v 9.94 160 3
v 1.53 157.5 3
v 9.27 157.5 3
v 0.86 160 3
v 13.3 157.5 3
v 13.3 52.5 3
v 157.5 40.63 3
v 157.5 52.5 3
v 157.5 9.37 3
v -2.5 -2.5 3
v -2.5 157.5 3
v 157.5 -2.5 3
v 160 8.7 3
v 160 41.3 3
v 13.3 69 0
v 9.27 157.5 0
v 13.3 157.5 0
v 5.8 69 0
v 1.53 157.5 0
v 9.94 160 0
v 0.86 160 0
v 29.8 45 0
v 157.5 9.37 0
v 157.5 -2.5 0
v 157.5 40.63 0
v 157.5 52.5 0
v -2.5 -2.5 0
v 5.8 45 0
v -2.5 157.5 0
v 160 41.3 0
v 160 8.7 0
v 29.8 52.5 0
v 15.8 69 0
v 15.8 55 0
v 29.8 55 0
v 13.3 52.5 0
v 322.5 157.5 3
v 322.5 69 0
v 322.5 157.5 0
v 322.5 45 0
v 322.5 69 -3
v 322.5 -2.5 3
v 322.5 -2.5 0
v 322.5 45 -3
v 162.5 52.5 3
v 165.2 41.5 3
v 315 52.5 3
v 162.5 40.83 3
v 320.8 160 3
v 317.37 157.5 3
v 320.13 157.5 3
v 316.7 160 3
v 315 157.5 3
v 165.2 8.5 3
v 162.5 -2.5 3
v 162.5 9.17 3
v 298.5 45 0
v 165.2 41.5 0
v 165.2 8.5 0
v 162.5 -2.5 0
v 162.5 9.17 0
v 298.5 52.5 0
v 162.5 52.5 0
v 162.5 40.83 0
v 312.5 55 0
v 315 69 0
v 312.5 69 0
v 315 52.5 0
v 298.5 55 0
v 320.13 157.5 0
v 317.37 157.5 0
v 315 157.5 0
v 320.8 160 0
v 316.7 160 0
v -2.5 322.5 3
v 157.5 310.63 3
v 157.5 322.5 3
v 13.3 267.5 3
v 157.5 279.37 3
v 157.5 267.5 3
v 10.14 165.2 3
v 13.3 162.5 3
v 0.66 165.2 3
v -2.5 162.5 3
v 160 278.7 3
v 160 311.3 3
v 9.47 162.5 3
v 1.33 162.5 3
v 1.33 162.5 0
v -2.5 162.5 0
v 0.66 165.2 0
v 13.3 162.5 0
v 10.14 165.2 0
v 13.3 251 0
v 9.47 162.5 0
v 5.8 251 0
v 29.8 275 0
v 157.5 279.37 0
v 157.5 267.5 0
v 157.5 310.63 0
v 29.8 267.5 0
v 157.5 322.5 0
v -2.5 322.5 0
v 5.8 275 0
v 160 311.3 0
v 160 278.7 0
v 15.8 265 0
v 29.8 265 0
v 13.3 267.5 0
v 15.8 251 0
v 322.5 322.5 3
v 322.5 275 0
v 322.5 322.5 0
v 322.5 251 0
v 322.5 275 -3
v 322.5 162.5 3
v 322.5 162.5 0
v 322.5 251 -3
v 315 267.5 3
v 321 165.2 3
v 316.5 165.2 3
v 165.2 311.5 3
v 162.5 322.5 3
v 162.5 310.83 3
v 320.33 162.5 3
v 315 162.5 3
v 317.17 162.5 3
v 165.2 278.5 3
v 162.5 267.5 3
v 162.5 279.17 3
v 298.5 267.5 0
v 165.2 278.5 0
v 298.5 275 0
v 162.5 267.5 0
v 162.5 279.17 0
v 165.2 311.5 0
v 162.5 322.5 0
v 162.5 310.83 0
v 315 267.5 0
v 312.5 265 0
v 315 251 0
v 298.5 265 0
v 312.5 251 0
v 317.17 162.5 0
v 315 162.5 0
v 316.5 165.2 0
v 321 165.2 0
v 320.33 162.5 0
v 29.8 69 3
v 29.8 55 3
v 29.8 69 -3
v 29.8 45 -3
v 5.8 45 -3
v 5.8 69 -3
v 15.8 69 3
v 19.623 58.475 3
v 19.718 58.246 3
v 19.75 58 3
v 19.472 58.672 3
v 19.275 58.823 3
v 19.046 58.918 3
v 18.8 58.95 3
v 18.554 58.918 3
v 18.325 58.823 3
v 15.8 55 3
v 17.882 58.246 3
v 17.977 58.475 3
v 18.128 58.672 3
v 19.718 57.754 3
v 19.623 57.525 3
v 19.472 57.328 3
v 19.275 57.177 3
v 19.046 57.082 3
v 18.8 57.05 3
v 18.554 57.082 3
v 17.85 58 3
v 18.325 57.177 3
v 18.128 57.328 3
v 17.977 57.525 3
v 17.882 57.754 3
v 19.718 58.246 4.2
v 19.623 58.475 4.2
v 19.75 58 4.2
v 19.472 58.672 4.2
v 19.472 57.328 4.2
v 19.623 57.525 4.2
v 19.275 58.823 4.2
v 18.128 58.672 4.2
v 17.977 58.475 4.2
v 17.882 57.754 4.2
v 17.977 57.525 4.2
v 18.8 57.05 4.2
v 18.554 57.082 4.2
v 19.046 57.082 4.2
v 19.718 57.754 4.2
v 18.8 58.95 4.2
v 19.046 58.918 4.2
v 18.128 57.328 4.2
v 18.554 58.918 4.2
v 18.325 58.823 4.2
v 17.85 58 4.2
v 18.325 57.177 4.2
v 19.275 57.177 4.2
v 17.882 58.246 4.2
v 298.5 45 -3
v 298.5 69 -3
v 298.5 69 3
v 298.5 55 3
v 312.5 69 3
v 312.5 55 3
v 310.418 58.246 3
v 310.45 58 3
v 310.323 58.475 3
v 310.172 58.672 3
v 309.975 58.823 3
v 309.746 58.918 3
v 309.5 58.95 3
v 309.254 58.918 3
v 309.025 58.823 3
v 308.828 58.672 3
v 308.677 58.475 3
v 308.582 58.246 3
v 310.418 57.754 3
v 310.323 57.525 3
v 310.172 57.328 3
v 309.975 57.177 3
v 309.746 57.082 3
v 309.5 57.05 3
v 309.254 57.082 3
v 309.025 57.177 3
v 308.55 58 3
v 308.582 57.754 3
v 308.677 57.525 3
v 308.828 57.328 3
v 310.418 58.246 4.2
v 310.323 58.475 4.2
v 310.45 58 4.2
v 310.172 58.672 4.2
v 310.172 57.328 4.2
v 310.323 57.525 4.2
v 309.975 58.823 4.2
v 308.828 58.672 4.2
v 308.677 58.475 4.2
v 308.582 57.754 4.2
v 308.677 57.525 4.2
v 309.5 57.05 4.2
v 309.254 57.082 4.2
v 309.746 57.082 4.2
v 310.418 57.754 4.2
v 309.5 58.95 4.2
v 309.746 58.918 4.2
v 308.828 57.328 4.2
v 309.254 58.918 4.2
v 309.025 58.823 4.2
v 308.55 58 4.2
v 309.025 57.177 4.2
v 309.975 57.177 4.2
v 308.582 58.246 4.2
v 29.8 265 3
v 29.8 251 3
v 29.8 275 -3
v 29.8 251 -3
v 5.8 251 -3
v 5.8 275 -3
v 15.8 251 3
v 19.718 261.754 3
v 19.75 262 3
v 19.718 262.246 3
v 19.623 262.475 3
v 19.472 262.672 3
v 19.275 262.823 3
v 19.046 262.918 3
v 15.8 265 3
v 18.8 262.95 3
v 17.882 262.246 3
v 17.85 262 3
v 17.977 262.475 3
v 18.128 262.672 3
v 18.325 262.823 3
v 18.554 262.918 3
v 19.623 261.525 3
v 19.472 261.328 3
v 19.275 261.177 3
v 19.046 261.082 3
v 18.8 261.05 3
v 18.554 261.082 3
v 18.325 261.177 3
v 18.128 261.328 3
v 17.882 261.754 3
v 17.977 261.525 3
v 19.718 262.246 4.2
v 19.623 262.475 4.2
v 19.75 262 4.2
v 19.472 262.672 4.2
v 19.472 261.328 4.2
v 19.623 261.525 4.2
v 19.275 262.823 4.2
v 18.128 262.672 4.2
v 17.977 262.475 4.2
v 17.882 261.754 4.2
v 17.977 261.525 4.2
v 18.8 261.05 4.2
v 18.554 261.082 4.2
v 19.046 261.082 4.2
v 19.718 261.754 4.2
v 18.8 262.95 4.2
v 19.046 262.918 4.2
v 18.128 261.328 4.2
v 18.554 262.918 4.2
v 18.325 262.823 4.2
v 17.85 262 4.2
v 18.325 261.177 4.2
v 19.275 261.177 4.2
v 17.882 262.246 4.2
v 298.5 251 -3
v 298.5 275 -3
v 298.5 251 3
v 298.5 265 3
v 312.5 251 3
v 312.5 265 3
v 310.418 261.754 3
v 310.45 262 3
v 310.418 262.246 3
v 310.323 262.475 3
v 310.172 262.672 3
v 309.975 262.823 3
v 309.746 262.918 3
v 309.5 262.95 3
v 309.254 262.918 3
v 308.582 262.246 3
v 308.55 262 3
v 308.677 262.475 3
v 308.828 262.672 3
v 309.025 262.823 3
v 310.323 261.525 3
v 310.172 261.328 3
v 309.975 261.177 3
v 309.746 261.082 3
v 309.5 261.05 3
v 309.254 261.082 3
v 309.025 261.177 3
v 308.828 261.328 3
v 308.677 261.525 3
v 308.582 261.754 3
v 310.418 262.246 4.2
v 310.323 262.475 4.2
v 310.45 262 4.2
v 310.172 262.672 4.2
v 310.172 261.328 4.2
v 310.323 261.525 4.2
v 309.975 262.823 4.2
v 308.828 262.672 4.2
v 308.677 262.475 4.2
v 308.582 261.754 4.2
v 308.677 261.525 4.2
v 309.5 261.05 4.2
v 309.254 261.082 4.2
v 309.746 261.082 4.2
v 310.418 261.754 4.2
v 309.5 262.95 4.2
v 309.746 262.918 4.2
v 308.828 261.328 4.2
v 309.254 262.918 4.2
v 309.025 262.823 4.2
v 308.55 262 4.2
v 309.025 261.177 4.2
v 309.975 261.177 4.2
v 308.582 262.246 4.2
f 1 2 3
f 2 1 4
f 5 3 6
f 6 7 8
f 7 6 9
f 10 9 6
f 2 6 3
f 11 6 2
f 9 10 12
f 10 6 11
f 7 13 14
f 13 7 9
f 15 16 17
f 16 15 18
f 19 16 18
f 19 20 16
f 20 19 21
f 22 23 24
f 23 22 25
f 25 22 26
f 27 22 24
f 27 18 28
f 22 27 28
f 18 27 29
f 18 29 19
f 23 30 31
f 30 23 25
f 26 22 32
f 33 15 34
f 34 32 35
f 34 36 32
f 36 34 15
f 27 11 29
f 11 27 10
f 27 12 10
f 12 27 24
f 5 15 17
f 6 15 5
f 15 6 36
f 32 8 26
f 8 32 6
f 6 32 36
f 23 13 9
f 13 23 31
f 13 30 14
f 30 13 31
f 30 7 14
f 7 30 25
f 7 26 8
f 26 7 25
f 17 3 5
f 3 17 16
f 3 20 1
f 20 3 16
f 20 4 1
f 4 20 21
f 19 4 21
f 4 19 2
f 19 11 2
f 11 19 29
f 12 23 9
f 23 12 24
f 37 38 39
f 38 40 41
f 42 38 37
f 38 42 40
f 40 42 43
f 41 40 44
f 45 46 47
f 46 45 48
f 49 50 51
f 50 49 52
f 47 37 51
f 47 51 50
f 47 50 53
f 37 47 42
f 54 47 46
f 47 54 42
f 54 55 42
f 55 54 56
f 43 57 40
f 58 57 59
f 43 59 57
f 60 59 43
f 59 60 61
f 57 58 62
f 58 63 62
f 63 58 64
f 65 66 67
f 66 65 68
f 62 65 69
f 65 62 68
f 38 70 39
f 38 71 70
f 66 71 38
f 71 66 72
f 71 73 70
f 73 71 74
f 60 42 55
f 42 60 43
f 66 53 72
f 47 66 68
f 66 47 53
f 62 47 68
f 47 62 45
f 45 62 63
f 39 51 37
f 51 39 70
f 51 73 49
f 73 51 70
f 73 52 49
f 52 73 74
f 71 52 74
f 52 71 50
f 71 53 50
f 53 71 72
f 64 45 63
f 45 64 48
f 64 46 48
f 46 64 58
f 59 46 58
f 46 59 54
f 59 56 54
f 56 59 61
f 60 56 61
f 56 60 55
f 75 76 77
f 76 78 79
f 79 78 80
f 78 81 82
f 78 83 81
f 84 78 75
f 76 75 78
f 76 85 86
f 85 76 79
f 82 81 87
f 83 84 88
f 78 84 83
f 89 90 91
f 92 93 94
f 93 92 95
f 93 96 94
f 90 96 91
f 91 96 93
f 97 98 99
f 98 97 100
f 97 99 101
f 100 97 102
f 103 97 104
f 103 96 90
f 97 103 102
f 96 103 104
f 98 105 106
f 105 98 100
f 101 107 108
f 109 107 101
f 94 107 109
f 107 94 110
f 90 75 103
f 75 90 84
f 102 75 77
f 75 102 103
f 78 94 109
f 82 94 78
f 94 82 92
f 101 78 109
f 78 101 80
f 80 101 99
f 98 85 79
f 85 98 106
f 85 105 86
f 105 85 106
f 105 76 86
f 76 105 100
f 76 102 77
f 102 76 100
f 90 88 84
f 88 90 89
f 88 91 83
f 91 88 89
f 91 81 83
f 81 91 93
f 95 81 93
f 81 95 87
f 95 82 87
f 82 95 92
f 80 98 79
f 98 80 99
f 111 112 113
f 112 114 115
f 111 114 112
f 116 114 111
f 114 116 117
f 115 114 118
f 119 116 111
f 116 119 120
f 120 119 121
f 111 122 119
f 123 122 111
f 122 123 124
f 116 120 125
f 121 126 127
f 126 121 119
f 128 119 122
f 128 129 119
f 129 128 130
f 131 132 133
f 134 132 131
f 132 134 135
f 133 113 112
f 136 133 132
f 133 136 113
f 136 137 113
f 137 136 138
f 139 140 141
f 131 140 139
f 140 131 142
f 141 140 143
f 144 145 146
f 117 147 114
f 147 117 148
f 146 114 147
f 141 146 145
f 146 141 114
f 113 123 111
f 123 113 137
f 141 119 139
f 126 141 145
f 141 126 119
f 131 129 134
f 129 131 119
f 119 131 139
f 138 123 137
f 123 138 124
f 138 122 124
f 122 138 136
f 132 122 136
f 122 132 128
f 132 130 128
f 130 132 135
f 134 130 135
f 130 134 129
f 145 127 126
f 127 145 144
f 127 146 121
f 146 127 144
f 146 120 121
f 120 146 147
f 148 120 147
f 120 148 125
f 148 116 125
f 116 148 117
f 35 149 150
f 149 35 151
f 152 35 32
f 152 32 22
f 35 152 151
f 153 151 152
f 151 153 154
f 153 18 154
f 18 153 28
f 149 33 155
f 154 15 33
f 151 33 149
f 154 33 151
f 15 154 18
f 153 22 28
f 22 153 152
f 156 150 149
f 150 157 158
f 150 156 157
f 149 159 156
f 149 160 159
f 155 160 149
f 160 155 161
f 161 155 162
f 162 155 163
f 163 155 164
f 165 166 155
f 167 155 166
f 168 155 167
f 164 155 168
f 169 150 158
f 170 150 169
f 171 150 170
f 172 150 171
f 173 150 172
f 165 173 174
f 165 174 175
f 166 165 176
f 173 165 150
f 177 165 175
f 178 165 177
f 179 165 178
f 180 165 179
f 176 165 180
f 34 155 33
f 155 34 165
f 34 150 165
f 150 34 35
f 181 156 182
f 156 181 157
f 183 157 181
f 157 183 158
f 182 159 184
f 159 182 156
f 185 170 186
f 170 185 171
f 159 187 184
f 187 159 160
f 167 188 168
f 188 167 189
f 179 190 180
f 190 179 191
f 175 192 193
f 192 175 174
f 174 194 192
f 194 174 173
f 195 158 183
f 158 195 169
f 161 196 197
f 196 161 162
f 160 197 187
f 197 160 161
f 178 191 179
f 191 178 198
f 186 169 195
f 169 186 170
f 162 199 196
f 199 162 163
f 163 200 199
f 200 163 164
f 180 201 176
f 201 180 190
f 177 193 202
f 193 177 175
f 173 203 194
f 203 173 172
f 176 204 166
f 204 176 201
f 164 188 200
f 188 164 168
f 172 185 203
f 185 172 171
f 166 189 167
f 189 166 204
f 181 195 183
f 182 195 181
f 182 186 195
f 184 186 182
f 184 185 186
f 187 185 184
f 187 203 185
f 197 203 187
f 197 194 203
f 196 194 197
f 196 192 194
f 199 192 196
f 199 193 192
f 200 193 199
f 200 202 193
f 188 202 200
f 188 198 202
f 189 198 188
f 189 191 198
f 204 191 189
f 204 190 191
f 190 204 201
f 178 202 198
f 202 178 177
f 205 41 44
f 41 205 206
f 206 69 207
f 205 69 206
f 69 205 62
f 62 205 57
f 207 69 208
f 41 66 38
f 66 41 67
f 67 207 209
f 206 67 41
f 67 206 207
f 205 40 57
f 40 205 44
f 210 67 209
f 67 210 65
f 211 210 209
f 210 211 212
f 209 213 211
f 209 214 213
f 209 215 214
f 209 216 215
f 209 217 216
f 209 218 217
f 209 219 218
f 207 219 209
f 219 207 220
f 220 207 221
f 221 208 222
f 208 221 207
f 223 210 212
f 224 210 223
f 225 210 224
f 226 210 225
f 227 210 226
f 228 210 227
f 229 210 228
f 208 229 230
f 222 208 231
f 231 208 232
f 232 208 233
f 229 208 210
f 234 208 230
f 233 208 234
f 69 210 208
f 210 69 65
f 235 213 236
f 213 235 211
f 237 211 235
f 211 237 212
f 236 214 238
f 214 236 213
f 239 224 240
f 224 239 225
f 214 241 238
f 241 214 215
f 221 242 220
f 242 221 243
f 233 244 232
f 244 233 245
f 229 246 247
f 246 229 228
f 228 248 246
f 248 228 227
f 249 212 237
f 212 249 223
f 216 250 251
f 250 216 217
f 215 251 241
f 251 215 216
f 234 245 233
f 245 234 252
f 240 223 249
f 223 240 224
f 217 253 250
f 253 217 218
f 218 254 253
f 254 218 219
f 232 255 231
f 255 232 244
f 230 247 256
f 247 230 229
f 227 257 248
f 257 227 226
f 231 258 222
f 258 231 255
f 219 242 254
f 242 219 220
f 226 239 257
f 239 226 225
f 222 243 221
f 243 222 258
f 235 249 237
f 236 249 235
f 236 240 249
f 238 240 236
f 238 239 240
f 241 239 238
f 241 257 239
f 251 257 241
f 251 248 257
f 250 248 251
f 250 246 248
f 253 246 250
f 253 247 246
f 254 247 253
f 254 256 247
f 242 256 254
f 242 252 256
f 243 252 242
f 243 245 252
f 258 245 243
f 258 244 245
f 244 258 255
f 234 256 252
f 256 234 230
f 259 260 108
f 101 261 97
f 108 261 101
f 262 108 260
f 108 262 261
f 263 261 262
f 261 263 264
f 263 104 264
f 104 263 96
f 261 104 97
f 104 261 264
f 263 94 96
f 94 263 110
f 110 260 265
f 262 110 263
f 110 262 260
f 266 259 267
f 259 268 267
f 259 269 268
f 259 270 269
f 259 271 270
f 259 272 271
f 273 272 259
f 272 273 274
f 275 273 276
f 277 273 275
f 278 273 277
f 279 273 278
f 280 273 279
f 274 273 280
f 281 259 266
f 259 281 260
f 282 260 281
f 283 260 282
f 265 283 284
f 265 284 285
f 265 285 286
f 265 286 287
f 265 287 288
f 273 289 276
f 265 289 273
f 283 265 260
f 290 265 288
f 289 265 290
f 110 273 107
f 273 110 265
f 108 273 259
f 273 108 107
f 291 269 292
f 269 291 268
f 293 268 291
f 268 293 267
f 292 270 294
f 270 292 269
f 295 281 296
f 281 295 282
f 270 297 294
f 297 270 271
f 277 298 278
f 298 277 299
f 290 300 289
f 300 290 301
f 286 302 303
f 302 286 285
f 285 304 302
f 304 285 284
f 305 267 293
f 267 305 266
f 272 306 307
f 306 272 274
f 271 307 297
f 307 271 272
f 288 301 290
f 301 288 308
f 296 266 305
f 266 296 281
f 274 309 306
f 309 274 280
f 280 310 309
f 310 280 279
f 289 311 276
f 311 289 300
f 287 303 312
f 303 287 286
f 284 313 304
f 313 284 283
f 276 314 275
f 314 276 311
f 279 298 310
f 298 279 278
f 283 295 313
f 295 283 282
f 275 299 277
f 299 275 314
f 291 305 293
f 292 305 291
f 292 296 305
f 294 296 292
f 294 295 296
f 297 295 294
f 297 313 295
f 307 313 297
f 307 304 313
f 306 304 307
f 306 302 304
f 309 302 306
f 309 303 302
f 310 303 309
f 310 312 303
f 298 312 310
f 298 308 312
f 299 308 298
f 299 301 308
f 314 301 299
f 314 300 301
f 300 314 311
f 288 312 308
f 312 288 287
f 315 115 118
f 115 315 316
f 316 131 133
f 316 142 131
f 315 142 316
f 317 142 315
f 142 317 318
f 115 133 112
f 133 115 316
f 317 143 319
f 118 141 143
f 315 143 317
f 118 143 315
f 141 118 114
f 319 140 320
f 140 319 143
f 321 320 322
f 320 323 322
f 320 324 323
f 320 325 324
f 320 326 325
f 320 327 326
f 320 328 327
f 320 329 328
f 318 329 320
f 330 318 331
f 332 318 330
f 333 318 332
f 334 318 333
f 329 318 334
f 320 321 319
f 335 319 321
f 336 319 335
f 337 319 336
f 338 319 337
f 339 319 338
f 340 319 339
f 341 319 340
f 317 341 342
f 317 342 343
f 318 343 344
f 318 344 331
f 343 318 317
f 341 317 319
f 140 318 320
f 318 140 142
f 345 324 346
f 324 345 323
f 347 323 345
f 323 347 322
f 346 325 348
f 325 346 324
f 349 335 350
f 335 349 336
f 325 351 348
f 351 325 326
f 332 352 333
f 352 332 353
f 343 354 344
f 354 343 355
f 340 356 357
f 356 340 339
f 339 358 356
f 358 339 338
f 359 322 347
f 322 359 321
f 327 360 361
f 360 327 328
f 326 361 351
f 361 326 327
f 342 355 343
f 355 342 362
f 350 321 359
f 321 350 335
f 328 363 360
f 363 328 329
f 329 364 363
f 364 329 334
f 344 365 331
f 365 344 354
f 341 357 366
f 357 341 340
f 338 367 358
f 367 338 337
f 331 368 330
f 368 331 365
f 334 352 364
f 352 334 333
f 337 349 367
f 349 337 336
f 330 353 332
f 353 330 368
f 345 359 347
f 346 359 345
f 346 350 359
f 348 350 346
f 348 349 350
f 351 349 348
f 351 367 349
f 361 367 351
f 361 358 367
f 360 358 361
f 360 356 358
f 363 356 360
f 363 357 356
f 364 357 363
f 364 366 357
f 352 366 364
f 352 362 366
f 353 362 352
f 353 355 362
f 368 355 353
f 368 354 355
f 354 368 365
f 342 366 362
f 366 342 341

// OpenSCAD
// IKEA 32x32cm frame — two-part 3D printed backplate for Inky Impression 13.3"
// All dimensions in mm
//
// === Assembly (front to back) ===
// 1. IKEA frame (glass + wood border)
// 2. Paper mat with 200x200mm opening (original IKEA mat, reused)
// 3. Display board (screen faces forward through mat opening)
// 4. 3D printed backplate (this model — two parts, replaces original hardboard)
// 5. IKEA metal clips (original clips hold everything in the frame)
//
// === Two-part design ===
// The backplate is two separate prints, glued together:
//
// Part 1: Backplate plate (3mm flat)
//   - 320x320mm, 3mm thick, with a through-hole for the board (296.7x210mm).
//   - Replaces the original IKEA hardboard, same 3mm thickness.
//   - IKEA metal clips grip the outer edges.
//   - Split into 4 quadrants with dovetail joints for the 180x180mm print bed.
//   - Print front-face down.
//
// Part 2: Corner brackets (4 pieces, glued to plate back)
//   - Each bracket has a flat base (3mm, glues to plate back) and a stepped
//     lip (3mm tall) that fits into the through-hole corner.
//   - The step self-aligns the bracket during gluing (registration feature)
//     and provides the ledge the board sits on (flush with plate front face).
//   - Knobs (ø1.9mm, 1.2mm tall) project from the step into the board's
//     mounting holes for alignment.
//   - Print base-down, step builds up on top — no support needed.
//   - Each bracket fits the 180x180mm print bed individually.
//
// Cross-section at a corner:
//
//   mat / front face (top)
//   ────────────┐         ┌────── plate front face
//               │ plate   │ step  (flush with front, board sits here)
//   ────────────┘ 3mm     │ 3mm
//               ┌─────────┤
//               │ bracket base (glued to plate back)
//               └─────────┘
//
// === Print constraints ===
// Printer: Bambu Lab A1 Mini, build volume 180x180x180mm.
// Nozzle: 0.4mm. Layer height: 0.20mm.
//
// Nozzle rules of thumb (0.4mm):
//   - Minimum wall: 0.8mm (2 perimeters), comfortable: 1.2mm (3 perimeters)
//   - Minimum gap (clearance): 0.4mm (1 nozzle width) to avoid bridging
//   - Features < 2mm may lose detail; features < 0.8mm won't print
//
// The 320x320mm plate is split into 4 interlocking quadrants (~160x160mm each)
// with dovetail edges for assembly.
//
// === Export ===
// print_part selects what to render for STL export:
//   0 = assembly view (default)
//   1–4 = plate quadrant (BL, BR, TL, TR)
//   5 = all 4 corner brackets
//
// Generate preview PNG:
//   xvfb-run -a openscad --imgsize 1024,1024 --autocenter --viewall --colorscheme BeforeDawn -o frame-assembly.png frame-assembly.scad
//
// Export all STLs:
//   for p in 1 2 3 4; do xvfb-run -a openscad -D "print_part=$p" -o quadrant$p.stl frame-assembly.scad; done
//   xvfb-run -a openscad -D "print_part=5" -o brackets.stl frame-assembly.scad
//
// IMPORTANT: After any change to this file, re-run the PNG and STL export
// commands above to keep the generated files in sync.

// --- IKEA Frame ---
// LOMVIKEN 32x32 cm, black
// https://www.ikea.com/de/de/p/lomviken-rahmen-schwarz-00335852/
frame_size = 320.00;
plate_thickness = 3.0;

// Mat opening (centered in frame)
mat_opening = 200.00;

// --- Display board (Pimoroni Inky Impression 13.3") ---
board_width  = 296.70;
board_height = 210.00;
board_thickness = 3.0;

// Corner mounting holes
hole_inset    = 3.00;
hole_diameter = 2.7;

// Corner rounding (estimated, not dimensioned in schematic)
corner_radius = 2.0;

// Viewable area (not centered on board — connector side has more margin)
viewable_width  = 270.40;
viewable_height = 202.80;
viewable_x = 9.00;
viewable_y = (board_height - viewable_height) / 2;

// --- Board positioning (viewable area centered in mat opening) ---
viewable_center_x = viewable_x + viewable_width / 2;
viewable_center_y = viewable_y + viewable_height / 2;
mat_center = frame_size / 2;
board_x = mat_center - viewable_center_x; // 15.80
board_y = mat_center - viewable_center_y; // 55.00

// --- Corner brackets ---
bracket_base = 3.0;            // base thickness (glued to plate back)
bracket_step = plate_thickness; // step height (flush with plate front)
bracket_pad  = 14.0;           // step overlap onto board area
bracket_rim  = 10.0;           // base overlap onto plate area

// Alignment knobs
knob_diameter = 1.9;
knob_height   = 1.2;

// --- Dovetail interlock ---
// Trapezoidal (dovetail) tabs: narrower at the base, wider at the tip.
// Once assembled from above (Z axis), the angled sides prevent separation
// in both X and Y. Only Z separation is possible — blocked by IKEA clips.
//
// All tab dimensions are derived from just two ratios plus the border width:
//   dovetail_angle — taper half-angle (consistent interlock across all joints)
//   tab_fill       — fraction of border width used by the slot tip
//
// Formula per border:
//   tab_tip  = border × tab_fill − 2 × joint_clearance
//   tab_base = tab_tip − 2 × tab_depth × tan(dovetail_angle)
//   wall     = border × (1 − tab_fill) / 2
joint_clearance = 0.2;
tab_depth       = 5.0;
dovetail_angle  = 15;
tab_fill        = 0.6;
half = frame_size / 2;

// Through-hole boundaries (= board position, no clearance)
hole_x_min = board_x;                       // 15.80
hole_x_max = board_x + board_width;         // 312.50
hole_y_min = board_y;                       // 55.00
hole_y_max = board_y + board_height;        // 265.00

// Border widths (solid zones where dovetail tabs are placed)
border_vert  = hole_y_min;                  // 55.00 (bottom = top)
border_left  = hole_x_min;                  // 15.80
border_right = frame_size - hole_x_max;     // 7.50

// Derived dovetail dimensions
dovetail_expansion = tab_depth * tan(dovetail_angle);
function dt_tip(border)  = border * tab_fill - 2 * joint_clearance;
function dt_base(border) = dt_tip(border) - 2 * dovetail_expansion;
function dt_wall(border) = border * (1 - tab_fill) / 2;

// Tab positions — centered in solid border zones
vtab_y_bot   = hole_y_min / 2;              // ~27.50 (bottom border)
vtab_y_top   = (hole_y_max + frame_size) / 2; // ~292.50 (top border)
htab_x_left  = hole_x_min / 2;              // ~7.90 (left border)
htab_x_right = (hole_x_max + frame_size) / 2; // ~316.25 (right border)

// --- Modules ---

module board() {
    hole_positions = [
        [hole_inset, hole_inset],
        [board_width - hole_inset, hole_inset],
        [hole_inset, board_height - hole_inset],
        [board_width - hole_inset, board_height - hole_inset],
    ];

    difference() {
        linear_extrude(height = board_thickness)
            offset(r = corner_radius)
            offset(delta = -corner_radius)
            square([board_width, board_height]);

        for (pos = hole_positions)
            translate([pos[0], pos[1], -0.1])
                cylinder(h = board_thickness + 0.2, r = hole_diameter / 2, $fn = 32);
    }
}

// --- 2D quadrant boundary with dovetail tab edges ---
// qx: 0=left, 1=right  qy: 0=bottom, 1=top
//
// Vertical split (x=160): tabs in bottom and top solid borders.
//   Left quadrants (qx==0) own the tabs, right quadrants get slots.
// Horizontal split (y=160): tabs in left AND right solid borders.
//   Bottom quadrants (qy==0) own the tabs, top quadrants get slots.
//
// All tabs assemble from above (Z axis). The dovetail angle prevents
// separation in X and Y once the IKEA clips hold the Z axis.

// Centered dovetail trapezoid: base (narrow) at x=-d/2, tip (wide) at x=+d/2
// Pass the border width — tip and base are computed from the shared ratios.
module dovetail_tab_2d(border) {
    w_tip  = dt_tip(border);
    w_base = dt_base(border);
    d = tab_depth;
    polygon([
        [-d/2, -w_base/2],
        [-d/2,  w_base/2],
        [ d/2,  w_tip/2],
        [ d/2, -w_tip/2]
    ]);
}

module dovetail_slot_2d(border) {
    w_tip  = dt_tip(border);
    w_base = dt_base(border);
    d = tab_depth;
    cl = joint_clearance;
    polygon([
        [-d/2 - cl, -w_base/2 - cl],
        [-d/2 - cl,  w_base/2 + cl],
        [ d/2 + cl,  w_tip/2 + cl],
        [ d/2 + cl, -w_tip/2 - cl]
    ]);
}

module quadrant_2d(qx, qy) {
    // Vertical split tab y-position for this quadrant's half
    vtab_y = (qy == 0) ? vtab_y_bot : vtab_y_top;

    difference() {
        union() {
            // Base square for this quadrant
            translate([qx * half, qy * half])
                square([half, half]);

            // Left quadrants (qx==0): add tab on right edge (vertical split)
            if (qx == 0)
                translate([half, vtab_y])
                    dovetail_tab_2d(border_vert);

            // Bottom-left (qx==0, qy==0): add small tab on top edge (left border)
            if (qy == 0 && qx == 0)
                translate([htab_x_left, half])
                    rotate([0, 0, 90])
                    dovetail_tab_2d(border_left);

            // Bottom-right (qx==1, qy==0): add narrow tab on top edge (right border)
            if (qy == 0 && qx == 1)
                translate([htab_x_right, half])
                    rotate([0, 0, 90])
                    dovetail_tab_2d(border_right);
        }

        // Right quadrants (qx==1): cut slot on left edge (vertical split)
        if (qx == 1)
            translate([half, vtab_y])
                dovetail_slot_2d(border_vert);

        // Top-left (qx==0, qy==1): cut slot on bottom edge (left border)
        if (qy == 1 && qx == 0)
            translate([htab_x_left, half])
                rotate([0, 0, 90])
                dovetail_slot_2d(border_left);

        // Top-right (qx==1, qy==1): cut slot on bottom edge (right border)
        if (qy == 1 && qx == 1)
            translate([htab_x_right, half])
                rotate([0, 0, 90])
                dovetail_slot_2d(border_right);
    }
}

// --- Full backplate plate (before quadrant splitting) ---

module backplate_plate() {
    difference() {
        cube([frame_size, frame_size, plate_thickness]);
        translate([board_x, board_y, -0.1])
            cube([board_width, board_height, plate_thickness + 0.2]);
    }
}

// --- Plate quadrant: slice with dovetail tab edges ---

module plate_quadrant(qx, qy) {
    intersection() {
        backplate_plate();
        linear_extrude(height = plate_thickness + 1)
            quadrant_2d(qx, qy);
    }
}

// --- Corner bracket ---
// Generated at local origin (base corner at [0,0,0]).
// cx: 0=left, 1=right  cy: 0=bottom, 1=top

module corner_bracket(cx, cy) {
    base_w = bracket_pad + bracket_rim;
    base_h = bracket_pad + bracket_rim;

    // Base (glued to plate back)
    cube([base_w, base_h, bracket_base]);

    // Step (fits into through-hole, flush with plate front)
    step_x = (cx == 0) ? bracket_rim : 0;
    step_y = (cy == 0) ? bracket_rim : 0;
    translate([step_x, step_y, bracket_base])
        cube([bracket_pad, bracket_pad, bracket_step]);

    // Alignment knob (projects into board mounting hole)
    knob_x = (cx == 0) ? bracket_rim + hole_inset : bracket_pad - hole_inset;
    knob_y = (cy == 0) ? bracket_rim + hole_inset : bracket_pad - hole_inset;
    translate([knob_x, knob_y, bracket_base + bracket_step])
        cylinder(h = knob_height, r = knob_diameter / 2, $fn = 24);
}

// Bracket world-space origin for assembly placement
function bracket_origin(cx, cy) = [
    min(board_x + cx * (board_width - bracket_pad),
        (cx == 0) ? board_x - bracket_rim : board_x + board_width),
    min(board_y + cy * (board_height - bracket_pad),
        (cy == 0) ? board_y - bracket_rim : board_y + board_height)
];

// --- View mode ---
// print_part:
//   0 = assembly view (all parts)
//   1–4 = plate quadrant for STL export (BL, BR, TL, TR)
//   5 = all 4 corner brackets arranged for printing

print_part = 0;
show_board = false;
show_split = true;
explode    = false;
split_gap  = 5;

// Corner/quadrant grid: [x, y] indexed 1–4 / 5–8 (BL, BR, TL, TR)
corner_grid = [[0, 0], [1, 0], [0, 1], [1, 1]];

if (print_part >= 1 && print_part <= 4) {
    // Export single plate quadrant at origin
    qx = corner_grid[print_part - 1][0];
    qy = corner_grid[print_part - 1][1];
    translate([-qx * half, -qy * half, 0])
        plate_quadrant(qx, qy);

} else if (print_part == 5) {
    // All 4 brackets in a 2x2 grid with 5mm spacing
    bracket_size = bracket_pad + bracket_rim;
    bracket_spacing = 5;
    for (i = [0:3]) {
        cx = corner_grid[i][0];
        cy = corner_grid[i][1];
        translate([cx * (bracket_size + bracket_spacing),
                   cy * (bracket_size + bracket_spacing), 0])
            corner_bracket(cx, cy);
    }

} else {
    // Assembly view
    explode_offset = explode ? 20 : 0;

    // Plate quadrants
    for (i = [0:3]) {
        qx = corner_grid[i][0];
        qy = corner_grid[i][1];
        gap = show_split
            ? [(qx - 0.5) * split_gap, (qy - 0.5) * split_gap, 0]
            : [0, 0, 0];
        col = (qx + qy) % 2 == 0 ? "White" : "WhiteSmoke";
        translate(gap + [0, 0, explode_offset])
            color(col) plate_quadrant(qx, qy);
    }

    // Corner brackets
    for (i = [0:3]) {
        cx = corner_grid[i][0];
        cy = corner_grid[i][1];
        origin = bracket_origin(cx, cy);
        translate([origin[0], origin[1], -bracket_base - explode_offset])
            color("Tomato", 0.8) corner_bracket(cx, cy);
    }

    // Board (reference only)
    if (show_board)
        translate([board_x, board_y, plate_thickness])
            color("SteelBlue") board();
}
